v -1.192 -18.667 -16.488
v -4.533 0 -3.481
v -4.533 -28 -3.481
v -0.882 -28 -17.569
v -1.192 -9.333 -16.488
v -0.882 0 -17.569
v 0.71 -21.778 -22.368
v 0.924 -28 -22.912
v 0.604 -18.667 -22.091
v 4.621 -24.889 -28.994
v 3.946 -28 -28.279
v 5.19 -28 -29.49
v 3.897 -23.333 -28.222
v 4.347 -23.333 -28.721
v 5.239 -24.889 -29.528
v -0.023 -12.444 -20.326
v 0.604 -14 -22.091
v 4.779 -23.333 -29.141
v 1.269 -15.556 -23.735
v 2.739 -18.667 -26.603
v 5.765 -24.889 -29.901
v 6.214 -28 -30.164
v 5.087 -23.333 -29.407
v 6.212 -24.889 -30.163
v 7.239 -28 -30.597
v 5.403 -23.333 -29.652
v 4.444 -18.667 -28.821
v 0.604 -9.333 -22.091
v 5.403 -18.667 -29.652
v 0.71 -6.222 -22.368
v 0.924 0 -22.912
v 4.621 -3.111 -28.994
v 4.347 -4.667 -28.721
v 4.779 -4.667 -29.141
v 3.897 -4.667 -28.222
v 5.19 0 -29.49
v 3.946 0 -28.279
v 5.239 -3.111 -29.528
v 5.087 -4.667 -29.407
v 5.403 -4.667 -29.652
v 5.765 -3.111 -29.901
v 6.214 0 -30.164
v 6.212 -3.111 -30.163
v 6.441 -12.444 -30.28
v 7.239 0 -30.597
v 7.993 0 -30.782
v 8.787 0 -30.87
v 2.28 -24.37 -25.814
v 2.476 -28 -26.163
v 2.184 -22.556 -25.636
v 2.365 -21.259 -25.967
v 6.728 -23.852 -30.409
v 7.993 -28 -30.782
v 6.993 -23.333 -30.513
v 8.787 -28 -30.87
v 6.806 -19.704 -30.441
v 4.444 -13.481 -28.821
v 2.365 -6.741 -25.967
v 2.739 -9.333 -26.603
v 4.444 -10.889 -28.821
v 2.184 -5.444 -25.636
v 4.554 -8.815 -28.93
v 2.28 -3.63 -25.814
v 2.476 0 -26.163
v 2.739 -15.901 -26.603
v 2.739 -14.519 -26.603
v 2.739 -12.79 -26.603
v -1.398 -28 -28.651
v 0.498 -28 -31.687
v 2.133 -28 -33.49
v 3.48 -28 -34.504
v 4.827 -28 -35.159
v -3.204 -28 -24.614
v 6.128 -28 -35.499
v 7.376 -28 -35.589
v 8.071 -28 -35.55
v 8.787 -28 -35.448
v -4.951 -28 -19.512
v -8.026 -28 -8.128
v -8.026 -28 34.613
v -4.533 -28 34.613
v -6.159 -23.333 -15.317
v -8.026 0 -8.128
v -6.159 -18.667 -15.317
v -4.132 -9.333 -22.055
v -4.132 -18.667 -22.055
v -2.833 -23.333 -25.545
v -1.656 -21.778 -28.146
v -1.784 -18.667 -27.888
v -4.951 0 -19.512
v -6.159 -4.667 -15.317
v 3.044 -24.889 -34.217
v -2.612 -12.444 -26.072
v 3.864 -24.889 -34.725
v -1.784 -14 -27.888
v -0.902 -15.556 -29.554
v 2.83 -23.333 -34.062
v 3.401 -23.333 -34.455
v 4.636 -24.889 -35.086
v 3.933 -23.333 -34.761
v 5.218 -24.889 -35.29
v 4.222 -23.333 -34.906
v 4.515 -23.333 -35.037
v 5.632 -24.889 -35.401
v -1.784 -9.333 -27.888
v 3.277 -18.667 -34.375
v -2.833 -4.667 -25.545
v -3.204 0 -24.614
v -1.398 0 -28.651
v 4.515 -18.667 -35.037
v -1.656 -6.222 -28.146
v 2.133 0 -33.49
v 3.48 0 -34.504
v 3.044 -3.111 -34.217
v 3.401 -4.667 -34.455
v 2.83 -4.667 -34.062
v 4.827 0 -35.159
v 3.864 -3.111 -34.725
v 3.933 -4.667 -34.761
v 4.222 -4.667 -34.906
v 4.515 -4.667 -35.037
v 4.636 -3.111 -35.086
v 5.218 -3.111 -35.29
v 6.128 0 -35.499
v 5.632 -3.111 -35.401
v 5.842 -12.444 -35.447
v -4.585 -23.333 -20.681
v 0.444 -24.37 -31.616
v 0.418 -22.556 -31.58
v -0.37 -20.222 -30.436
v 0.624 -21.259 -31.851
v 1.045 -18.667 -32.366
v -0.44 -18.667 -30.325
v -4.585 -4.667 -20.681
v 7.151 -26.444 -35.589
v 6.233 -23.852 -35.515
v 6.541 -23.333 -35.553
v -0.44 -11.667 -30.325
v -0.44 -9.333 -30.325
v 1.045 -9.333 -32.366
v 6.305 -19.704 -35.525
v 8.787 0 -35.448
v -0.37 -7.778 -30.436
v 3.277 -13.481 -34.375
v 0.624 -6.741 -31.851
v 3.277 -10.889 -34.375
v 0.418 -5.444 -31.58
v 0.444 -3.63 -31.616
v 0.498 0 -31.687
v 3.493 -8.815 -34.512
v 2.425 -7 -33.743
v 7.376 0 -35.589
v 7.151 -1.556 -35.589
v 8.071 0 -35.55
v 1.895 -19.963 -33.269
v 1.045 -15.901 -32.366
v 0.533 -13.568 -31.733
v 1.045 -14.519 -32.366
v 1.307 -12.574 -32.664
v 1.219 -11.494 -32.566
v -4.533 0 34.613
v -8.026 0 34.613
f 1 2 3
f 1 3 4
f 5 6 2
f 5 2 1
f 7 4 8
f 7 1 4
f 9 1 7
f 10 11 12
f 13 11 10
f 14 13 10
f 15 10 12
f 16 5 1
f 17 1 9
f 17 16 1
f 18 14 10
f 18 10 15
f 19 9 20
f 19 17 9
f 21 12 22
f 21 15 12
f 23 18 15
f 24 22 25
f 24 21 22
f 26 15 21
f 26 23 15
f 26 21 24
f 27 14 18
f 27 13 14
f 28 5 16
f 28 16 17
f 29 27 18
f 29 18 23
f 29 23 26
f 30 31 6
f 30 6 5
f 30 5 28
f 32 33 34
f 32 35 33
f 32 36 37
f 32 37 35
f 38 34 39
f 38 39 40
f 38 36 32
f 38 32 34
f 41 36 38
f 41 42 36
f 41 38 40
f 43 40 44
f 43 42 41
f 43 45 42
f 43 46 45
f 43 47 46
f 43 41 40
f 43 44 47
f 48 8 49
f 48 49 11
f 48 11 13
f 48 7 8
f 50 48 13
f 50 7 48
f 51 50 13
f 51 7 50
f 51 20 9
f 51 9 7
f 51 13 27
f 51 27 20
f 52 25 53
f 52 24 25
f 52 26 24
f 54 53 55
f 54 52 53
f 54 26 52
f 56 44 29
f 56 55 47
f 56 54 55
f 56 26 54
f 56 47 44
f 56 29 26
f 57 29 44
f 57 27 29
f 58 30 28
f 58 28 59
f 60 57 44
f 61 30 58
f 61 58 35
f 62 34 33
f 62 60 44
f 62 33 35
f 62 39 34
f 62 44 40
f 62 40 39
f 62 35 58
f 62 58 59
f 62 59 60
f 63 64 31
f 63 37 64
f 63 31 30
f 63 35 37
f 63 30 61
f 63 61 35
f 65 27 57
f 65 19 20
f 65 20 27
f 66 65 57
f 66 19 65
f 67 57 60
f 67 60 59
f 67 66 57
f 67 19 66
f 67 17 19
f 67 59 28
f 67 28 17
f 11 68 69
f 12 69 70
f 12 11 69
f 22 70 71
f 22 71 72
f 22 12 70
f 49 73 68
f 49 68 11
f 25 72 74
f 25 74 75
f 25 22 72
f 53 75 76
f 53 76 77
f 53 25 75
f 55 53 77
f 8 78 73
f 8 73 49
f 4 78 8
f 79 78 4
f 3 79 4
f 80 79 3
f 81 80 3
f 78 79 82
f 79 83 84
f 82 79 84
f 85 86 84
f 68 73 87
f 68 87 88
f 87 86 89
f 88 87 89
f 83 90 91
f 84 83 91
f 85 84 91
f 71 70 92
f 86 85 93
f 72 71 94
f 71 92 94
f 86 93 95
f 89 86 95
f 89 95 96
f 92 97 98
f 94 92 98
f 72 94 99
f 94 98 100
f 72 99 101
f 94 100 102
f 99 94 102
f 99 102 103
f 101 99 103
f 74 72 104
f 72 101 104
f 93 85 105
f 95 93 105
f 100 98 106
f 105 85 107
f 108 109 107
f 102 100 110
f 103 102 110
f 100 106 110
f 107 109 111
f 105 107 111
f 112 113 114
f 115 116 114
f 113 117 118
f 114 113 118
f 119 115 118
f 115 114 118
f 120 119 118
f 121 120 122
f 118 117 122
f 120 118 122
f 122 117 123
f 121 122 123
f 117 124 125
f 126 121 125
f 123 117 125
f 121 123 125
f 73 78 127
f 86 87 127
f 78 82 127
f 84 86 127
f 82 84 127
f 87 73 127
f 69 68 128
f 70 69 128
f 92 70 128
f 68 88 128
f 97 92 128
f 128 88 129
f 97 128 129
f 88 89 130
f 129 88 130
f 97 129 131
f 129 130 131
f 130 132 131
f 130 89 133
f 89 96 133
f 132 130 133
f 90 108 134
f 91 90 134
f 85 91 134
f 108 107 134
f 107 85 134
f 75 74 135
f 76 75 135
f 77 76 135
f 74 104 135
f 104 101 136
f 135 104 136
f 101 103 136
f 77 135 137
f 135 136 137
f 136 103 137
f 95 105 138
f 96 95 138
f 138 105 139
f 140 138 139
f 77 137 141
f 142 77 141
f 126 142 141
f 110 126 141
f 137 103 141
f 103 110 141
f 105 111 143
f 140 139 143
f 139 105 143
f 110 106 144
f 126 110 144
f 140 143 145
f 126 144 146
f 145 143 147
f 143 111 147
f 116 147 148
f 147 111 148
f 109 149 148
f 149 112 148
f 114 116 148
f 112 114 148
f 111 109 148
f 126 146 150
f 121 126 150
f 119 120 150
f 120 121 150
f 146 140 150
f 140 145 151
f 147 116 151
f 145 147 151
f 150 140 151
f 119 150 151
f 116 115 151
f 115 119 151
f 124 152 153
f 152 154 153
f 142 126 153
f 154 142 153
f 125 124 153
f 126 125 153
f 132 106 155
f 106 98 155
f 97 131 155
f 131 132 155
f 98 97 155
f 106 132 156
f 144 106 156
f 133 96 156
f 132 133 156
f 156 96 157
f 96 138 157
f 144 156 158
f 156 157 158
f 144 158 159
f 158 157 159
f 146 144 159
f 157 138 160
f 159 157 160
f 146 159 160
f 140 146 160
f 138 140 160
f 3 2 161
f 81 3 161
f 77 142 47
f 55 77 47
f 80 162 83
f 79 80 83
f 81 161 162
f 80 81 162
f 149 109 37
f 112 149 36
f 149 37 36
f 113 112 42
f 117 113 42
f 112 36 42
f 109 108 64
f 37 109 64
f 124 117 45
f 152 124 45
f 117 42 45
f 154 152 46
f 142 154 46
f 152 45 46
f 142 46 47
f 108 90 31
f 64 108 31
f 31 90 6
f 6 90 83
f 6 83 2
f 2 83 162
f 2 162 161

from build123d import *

# Parameters (mm, degrees)
F1_DEPTH = 28


with BuildPart() as f1:
    # F0 (on Front) → F1 (new body)
    with BuildSketch(Plane.XZ):
        with BuildLine():
            Line((-4.5333905146, 34.6125476062), (-8.0259768292, 34.6125476062))
            Line((-8.0259768292, 34.6125476062), (-8.0259768292, -3.4810174257))
            Line((-8.0259768292, -3.4810174257), (-8.0259768292, -8.127710782))
            add(Edge.make_bspline(
                [(-8.0259768292, -8.127710782), (-4.3456946952, -22.6571589788), (-0.6654125612, -37.1866071756), (8.7871747091, -35.4477465153)],
                knots=[0, 0, 0, 0, 0.4330503534, 0.4330503534, 0.4330503534, 0.4330503534], degree=3))
            Line((8.7871747091, -35.4477465153), (8.7871747091, -30.869955197))
            add(Edge.make_bspline(
                [(-4.5333905146, -3.4810174257), (-0.9766891541, -16.9478294021), (1.169743888, -30.5117774218), (8.7871747091, -30.869955197)],
                knots=[0, 0, 0, 0, 0.5097867068, 0.5097867068, 0.5097867068, 0.5097867068], degree=3))
            Line((-4.5333905146, -3.4810174257), (-4.5333905146, 34.6125476062))
        make_face()
    extrude(amount=F1_DEPTH)


solid = f1.part
